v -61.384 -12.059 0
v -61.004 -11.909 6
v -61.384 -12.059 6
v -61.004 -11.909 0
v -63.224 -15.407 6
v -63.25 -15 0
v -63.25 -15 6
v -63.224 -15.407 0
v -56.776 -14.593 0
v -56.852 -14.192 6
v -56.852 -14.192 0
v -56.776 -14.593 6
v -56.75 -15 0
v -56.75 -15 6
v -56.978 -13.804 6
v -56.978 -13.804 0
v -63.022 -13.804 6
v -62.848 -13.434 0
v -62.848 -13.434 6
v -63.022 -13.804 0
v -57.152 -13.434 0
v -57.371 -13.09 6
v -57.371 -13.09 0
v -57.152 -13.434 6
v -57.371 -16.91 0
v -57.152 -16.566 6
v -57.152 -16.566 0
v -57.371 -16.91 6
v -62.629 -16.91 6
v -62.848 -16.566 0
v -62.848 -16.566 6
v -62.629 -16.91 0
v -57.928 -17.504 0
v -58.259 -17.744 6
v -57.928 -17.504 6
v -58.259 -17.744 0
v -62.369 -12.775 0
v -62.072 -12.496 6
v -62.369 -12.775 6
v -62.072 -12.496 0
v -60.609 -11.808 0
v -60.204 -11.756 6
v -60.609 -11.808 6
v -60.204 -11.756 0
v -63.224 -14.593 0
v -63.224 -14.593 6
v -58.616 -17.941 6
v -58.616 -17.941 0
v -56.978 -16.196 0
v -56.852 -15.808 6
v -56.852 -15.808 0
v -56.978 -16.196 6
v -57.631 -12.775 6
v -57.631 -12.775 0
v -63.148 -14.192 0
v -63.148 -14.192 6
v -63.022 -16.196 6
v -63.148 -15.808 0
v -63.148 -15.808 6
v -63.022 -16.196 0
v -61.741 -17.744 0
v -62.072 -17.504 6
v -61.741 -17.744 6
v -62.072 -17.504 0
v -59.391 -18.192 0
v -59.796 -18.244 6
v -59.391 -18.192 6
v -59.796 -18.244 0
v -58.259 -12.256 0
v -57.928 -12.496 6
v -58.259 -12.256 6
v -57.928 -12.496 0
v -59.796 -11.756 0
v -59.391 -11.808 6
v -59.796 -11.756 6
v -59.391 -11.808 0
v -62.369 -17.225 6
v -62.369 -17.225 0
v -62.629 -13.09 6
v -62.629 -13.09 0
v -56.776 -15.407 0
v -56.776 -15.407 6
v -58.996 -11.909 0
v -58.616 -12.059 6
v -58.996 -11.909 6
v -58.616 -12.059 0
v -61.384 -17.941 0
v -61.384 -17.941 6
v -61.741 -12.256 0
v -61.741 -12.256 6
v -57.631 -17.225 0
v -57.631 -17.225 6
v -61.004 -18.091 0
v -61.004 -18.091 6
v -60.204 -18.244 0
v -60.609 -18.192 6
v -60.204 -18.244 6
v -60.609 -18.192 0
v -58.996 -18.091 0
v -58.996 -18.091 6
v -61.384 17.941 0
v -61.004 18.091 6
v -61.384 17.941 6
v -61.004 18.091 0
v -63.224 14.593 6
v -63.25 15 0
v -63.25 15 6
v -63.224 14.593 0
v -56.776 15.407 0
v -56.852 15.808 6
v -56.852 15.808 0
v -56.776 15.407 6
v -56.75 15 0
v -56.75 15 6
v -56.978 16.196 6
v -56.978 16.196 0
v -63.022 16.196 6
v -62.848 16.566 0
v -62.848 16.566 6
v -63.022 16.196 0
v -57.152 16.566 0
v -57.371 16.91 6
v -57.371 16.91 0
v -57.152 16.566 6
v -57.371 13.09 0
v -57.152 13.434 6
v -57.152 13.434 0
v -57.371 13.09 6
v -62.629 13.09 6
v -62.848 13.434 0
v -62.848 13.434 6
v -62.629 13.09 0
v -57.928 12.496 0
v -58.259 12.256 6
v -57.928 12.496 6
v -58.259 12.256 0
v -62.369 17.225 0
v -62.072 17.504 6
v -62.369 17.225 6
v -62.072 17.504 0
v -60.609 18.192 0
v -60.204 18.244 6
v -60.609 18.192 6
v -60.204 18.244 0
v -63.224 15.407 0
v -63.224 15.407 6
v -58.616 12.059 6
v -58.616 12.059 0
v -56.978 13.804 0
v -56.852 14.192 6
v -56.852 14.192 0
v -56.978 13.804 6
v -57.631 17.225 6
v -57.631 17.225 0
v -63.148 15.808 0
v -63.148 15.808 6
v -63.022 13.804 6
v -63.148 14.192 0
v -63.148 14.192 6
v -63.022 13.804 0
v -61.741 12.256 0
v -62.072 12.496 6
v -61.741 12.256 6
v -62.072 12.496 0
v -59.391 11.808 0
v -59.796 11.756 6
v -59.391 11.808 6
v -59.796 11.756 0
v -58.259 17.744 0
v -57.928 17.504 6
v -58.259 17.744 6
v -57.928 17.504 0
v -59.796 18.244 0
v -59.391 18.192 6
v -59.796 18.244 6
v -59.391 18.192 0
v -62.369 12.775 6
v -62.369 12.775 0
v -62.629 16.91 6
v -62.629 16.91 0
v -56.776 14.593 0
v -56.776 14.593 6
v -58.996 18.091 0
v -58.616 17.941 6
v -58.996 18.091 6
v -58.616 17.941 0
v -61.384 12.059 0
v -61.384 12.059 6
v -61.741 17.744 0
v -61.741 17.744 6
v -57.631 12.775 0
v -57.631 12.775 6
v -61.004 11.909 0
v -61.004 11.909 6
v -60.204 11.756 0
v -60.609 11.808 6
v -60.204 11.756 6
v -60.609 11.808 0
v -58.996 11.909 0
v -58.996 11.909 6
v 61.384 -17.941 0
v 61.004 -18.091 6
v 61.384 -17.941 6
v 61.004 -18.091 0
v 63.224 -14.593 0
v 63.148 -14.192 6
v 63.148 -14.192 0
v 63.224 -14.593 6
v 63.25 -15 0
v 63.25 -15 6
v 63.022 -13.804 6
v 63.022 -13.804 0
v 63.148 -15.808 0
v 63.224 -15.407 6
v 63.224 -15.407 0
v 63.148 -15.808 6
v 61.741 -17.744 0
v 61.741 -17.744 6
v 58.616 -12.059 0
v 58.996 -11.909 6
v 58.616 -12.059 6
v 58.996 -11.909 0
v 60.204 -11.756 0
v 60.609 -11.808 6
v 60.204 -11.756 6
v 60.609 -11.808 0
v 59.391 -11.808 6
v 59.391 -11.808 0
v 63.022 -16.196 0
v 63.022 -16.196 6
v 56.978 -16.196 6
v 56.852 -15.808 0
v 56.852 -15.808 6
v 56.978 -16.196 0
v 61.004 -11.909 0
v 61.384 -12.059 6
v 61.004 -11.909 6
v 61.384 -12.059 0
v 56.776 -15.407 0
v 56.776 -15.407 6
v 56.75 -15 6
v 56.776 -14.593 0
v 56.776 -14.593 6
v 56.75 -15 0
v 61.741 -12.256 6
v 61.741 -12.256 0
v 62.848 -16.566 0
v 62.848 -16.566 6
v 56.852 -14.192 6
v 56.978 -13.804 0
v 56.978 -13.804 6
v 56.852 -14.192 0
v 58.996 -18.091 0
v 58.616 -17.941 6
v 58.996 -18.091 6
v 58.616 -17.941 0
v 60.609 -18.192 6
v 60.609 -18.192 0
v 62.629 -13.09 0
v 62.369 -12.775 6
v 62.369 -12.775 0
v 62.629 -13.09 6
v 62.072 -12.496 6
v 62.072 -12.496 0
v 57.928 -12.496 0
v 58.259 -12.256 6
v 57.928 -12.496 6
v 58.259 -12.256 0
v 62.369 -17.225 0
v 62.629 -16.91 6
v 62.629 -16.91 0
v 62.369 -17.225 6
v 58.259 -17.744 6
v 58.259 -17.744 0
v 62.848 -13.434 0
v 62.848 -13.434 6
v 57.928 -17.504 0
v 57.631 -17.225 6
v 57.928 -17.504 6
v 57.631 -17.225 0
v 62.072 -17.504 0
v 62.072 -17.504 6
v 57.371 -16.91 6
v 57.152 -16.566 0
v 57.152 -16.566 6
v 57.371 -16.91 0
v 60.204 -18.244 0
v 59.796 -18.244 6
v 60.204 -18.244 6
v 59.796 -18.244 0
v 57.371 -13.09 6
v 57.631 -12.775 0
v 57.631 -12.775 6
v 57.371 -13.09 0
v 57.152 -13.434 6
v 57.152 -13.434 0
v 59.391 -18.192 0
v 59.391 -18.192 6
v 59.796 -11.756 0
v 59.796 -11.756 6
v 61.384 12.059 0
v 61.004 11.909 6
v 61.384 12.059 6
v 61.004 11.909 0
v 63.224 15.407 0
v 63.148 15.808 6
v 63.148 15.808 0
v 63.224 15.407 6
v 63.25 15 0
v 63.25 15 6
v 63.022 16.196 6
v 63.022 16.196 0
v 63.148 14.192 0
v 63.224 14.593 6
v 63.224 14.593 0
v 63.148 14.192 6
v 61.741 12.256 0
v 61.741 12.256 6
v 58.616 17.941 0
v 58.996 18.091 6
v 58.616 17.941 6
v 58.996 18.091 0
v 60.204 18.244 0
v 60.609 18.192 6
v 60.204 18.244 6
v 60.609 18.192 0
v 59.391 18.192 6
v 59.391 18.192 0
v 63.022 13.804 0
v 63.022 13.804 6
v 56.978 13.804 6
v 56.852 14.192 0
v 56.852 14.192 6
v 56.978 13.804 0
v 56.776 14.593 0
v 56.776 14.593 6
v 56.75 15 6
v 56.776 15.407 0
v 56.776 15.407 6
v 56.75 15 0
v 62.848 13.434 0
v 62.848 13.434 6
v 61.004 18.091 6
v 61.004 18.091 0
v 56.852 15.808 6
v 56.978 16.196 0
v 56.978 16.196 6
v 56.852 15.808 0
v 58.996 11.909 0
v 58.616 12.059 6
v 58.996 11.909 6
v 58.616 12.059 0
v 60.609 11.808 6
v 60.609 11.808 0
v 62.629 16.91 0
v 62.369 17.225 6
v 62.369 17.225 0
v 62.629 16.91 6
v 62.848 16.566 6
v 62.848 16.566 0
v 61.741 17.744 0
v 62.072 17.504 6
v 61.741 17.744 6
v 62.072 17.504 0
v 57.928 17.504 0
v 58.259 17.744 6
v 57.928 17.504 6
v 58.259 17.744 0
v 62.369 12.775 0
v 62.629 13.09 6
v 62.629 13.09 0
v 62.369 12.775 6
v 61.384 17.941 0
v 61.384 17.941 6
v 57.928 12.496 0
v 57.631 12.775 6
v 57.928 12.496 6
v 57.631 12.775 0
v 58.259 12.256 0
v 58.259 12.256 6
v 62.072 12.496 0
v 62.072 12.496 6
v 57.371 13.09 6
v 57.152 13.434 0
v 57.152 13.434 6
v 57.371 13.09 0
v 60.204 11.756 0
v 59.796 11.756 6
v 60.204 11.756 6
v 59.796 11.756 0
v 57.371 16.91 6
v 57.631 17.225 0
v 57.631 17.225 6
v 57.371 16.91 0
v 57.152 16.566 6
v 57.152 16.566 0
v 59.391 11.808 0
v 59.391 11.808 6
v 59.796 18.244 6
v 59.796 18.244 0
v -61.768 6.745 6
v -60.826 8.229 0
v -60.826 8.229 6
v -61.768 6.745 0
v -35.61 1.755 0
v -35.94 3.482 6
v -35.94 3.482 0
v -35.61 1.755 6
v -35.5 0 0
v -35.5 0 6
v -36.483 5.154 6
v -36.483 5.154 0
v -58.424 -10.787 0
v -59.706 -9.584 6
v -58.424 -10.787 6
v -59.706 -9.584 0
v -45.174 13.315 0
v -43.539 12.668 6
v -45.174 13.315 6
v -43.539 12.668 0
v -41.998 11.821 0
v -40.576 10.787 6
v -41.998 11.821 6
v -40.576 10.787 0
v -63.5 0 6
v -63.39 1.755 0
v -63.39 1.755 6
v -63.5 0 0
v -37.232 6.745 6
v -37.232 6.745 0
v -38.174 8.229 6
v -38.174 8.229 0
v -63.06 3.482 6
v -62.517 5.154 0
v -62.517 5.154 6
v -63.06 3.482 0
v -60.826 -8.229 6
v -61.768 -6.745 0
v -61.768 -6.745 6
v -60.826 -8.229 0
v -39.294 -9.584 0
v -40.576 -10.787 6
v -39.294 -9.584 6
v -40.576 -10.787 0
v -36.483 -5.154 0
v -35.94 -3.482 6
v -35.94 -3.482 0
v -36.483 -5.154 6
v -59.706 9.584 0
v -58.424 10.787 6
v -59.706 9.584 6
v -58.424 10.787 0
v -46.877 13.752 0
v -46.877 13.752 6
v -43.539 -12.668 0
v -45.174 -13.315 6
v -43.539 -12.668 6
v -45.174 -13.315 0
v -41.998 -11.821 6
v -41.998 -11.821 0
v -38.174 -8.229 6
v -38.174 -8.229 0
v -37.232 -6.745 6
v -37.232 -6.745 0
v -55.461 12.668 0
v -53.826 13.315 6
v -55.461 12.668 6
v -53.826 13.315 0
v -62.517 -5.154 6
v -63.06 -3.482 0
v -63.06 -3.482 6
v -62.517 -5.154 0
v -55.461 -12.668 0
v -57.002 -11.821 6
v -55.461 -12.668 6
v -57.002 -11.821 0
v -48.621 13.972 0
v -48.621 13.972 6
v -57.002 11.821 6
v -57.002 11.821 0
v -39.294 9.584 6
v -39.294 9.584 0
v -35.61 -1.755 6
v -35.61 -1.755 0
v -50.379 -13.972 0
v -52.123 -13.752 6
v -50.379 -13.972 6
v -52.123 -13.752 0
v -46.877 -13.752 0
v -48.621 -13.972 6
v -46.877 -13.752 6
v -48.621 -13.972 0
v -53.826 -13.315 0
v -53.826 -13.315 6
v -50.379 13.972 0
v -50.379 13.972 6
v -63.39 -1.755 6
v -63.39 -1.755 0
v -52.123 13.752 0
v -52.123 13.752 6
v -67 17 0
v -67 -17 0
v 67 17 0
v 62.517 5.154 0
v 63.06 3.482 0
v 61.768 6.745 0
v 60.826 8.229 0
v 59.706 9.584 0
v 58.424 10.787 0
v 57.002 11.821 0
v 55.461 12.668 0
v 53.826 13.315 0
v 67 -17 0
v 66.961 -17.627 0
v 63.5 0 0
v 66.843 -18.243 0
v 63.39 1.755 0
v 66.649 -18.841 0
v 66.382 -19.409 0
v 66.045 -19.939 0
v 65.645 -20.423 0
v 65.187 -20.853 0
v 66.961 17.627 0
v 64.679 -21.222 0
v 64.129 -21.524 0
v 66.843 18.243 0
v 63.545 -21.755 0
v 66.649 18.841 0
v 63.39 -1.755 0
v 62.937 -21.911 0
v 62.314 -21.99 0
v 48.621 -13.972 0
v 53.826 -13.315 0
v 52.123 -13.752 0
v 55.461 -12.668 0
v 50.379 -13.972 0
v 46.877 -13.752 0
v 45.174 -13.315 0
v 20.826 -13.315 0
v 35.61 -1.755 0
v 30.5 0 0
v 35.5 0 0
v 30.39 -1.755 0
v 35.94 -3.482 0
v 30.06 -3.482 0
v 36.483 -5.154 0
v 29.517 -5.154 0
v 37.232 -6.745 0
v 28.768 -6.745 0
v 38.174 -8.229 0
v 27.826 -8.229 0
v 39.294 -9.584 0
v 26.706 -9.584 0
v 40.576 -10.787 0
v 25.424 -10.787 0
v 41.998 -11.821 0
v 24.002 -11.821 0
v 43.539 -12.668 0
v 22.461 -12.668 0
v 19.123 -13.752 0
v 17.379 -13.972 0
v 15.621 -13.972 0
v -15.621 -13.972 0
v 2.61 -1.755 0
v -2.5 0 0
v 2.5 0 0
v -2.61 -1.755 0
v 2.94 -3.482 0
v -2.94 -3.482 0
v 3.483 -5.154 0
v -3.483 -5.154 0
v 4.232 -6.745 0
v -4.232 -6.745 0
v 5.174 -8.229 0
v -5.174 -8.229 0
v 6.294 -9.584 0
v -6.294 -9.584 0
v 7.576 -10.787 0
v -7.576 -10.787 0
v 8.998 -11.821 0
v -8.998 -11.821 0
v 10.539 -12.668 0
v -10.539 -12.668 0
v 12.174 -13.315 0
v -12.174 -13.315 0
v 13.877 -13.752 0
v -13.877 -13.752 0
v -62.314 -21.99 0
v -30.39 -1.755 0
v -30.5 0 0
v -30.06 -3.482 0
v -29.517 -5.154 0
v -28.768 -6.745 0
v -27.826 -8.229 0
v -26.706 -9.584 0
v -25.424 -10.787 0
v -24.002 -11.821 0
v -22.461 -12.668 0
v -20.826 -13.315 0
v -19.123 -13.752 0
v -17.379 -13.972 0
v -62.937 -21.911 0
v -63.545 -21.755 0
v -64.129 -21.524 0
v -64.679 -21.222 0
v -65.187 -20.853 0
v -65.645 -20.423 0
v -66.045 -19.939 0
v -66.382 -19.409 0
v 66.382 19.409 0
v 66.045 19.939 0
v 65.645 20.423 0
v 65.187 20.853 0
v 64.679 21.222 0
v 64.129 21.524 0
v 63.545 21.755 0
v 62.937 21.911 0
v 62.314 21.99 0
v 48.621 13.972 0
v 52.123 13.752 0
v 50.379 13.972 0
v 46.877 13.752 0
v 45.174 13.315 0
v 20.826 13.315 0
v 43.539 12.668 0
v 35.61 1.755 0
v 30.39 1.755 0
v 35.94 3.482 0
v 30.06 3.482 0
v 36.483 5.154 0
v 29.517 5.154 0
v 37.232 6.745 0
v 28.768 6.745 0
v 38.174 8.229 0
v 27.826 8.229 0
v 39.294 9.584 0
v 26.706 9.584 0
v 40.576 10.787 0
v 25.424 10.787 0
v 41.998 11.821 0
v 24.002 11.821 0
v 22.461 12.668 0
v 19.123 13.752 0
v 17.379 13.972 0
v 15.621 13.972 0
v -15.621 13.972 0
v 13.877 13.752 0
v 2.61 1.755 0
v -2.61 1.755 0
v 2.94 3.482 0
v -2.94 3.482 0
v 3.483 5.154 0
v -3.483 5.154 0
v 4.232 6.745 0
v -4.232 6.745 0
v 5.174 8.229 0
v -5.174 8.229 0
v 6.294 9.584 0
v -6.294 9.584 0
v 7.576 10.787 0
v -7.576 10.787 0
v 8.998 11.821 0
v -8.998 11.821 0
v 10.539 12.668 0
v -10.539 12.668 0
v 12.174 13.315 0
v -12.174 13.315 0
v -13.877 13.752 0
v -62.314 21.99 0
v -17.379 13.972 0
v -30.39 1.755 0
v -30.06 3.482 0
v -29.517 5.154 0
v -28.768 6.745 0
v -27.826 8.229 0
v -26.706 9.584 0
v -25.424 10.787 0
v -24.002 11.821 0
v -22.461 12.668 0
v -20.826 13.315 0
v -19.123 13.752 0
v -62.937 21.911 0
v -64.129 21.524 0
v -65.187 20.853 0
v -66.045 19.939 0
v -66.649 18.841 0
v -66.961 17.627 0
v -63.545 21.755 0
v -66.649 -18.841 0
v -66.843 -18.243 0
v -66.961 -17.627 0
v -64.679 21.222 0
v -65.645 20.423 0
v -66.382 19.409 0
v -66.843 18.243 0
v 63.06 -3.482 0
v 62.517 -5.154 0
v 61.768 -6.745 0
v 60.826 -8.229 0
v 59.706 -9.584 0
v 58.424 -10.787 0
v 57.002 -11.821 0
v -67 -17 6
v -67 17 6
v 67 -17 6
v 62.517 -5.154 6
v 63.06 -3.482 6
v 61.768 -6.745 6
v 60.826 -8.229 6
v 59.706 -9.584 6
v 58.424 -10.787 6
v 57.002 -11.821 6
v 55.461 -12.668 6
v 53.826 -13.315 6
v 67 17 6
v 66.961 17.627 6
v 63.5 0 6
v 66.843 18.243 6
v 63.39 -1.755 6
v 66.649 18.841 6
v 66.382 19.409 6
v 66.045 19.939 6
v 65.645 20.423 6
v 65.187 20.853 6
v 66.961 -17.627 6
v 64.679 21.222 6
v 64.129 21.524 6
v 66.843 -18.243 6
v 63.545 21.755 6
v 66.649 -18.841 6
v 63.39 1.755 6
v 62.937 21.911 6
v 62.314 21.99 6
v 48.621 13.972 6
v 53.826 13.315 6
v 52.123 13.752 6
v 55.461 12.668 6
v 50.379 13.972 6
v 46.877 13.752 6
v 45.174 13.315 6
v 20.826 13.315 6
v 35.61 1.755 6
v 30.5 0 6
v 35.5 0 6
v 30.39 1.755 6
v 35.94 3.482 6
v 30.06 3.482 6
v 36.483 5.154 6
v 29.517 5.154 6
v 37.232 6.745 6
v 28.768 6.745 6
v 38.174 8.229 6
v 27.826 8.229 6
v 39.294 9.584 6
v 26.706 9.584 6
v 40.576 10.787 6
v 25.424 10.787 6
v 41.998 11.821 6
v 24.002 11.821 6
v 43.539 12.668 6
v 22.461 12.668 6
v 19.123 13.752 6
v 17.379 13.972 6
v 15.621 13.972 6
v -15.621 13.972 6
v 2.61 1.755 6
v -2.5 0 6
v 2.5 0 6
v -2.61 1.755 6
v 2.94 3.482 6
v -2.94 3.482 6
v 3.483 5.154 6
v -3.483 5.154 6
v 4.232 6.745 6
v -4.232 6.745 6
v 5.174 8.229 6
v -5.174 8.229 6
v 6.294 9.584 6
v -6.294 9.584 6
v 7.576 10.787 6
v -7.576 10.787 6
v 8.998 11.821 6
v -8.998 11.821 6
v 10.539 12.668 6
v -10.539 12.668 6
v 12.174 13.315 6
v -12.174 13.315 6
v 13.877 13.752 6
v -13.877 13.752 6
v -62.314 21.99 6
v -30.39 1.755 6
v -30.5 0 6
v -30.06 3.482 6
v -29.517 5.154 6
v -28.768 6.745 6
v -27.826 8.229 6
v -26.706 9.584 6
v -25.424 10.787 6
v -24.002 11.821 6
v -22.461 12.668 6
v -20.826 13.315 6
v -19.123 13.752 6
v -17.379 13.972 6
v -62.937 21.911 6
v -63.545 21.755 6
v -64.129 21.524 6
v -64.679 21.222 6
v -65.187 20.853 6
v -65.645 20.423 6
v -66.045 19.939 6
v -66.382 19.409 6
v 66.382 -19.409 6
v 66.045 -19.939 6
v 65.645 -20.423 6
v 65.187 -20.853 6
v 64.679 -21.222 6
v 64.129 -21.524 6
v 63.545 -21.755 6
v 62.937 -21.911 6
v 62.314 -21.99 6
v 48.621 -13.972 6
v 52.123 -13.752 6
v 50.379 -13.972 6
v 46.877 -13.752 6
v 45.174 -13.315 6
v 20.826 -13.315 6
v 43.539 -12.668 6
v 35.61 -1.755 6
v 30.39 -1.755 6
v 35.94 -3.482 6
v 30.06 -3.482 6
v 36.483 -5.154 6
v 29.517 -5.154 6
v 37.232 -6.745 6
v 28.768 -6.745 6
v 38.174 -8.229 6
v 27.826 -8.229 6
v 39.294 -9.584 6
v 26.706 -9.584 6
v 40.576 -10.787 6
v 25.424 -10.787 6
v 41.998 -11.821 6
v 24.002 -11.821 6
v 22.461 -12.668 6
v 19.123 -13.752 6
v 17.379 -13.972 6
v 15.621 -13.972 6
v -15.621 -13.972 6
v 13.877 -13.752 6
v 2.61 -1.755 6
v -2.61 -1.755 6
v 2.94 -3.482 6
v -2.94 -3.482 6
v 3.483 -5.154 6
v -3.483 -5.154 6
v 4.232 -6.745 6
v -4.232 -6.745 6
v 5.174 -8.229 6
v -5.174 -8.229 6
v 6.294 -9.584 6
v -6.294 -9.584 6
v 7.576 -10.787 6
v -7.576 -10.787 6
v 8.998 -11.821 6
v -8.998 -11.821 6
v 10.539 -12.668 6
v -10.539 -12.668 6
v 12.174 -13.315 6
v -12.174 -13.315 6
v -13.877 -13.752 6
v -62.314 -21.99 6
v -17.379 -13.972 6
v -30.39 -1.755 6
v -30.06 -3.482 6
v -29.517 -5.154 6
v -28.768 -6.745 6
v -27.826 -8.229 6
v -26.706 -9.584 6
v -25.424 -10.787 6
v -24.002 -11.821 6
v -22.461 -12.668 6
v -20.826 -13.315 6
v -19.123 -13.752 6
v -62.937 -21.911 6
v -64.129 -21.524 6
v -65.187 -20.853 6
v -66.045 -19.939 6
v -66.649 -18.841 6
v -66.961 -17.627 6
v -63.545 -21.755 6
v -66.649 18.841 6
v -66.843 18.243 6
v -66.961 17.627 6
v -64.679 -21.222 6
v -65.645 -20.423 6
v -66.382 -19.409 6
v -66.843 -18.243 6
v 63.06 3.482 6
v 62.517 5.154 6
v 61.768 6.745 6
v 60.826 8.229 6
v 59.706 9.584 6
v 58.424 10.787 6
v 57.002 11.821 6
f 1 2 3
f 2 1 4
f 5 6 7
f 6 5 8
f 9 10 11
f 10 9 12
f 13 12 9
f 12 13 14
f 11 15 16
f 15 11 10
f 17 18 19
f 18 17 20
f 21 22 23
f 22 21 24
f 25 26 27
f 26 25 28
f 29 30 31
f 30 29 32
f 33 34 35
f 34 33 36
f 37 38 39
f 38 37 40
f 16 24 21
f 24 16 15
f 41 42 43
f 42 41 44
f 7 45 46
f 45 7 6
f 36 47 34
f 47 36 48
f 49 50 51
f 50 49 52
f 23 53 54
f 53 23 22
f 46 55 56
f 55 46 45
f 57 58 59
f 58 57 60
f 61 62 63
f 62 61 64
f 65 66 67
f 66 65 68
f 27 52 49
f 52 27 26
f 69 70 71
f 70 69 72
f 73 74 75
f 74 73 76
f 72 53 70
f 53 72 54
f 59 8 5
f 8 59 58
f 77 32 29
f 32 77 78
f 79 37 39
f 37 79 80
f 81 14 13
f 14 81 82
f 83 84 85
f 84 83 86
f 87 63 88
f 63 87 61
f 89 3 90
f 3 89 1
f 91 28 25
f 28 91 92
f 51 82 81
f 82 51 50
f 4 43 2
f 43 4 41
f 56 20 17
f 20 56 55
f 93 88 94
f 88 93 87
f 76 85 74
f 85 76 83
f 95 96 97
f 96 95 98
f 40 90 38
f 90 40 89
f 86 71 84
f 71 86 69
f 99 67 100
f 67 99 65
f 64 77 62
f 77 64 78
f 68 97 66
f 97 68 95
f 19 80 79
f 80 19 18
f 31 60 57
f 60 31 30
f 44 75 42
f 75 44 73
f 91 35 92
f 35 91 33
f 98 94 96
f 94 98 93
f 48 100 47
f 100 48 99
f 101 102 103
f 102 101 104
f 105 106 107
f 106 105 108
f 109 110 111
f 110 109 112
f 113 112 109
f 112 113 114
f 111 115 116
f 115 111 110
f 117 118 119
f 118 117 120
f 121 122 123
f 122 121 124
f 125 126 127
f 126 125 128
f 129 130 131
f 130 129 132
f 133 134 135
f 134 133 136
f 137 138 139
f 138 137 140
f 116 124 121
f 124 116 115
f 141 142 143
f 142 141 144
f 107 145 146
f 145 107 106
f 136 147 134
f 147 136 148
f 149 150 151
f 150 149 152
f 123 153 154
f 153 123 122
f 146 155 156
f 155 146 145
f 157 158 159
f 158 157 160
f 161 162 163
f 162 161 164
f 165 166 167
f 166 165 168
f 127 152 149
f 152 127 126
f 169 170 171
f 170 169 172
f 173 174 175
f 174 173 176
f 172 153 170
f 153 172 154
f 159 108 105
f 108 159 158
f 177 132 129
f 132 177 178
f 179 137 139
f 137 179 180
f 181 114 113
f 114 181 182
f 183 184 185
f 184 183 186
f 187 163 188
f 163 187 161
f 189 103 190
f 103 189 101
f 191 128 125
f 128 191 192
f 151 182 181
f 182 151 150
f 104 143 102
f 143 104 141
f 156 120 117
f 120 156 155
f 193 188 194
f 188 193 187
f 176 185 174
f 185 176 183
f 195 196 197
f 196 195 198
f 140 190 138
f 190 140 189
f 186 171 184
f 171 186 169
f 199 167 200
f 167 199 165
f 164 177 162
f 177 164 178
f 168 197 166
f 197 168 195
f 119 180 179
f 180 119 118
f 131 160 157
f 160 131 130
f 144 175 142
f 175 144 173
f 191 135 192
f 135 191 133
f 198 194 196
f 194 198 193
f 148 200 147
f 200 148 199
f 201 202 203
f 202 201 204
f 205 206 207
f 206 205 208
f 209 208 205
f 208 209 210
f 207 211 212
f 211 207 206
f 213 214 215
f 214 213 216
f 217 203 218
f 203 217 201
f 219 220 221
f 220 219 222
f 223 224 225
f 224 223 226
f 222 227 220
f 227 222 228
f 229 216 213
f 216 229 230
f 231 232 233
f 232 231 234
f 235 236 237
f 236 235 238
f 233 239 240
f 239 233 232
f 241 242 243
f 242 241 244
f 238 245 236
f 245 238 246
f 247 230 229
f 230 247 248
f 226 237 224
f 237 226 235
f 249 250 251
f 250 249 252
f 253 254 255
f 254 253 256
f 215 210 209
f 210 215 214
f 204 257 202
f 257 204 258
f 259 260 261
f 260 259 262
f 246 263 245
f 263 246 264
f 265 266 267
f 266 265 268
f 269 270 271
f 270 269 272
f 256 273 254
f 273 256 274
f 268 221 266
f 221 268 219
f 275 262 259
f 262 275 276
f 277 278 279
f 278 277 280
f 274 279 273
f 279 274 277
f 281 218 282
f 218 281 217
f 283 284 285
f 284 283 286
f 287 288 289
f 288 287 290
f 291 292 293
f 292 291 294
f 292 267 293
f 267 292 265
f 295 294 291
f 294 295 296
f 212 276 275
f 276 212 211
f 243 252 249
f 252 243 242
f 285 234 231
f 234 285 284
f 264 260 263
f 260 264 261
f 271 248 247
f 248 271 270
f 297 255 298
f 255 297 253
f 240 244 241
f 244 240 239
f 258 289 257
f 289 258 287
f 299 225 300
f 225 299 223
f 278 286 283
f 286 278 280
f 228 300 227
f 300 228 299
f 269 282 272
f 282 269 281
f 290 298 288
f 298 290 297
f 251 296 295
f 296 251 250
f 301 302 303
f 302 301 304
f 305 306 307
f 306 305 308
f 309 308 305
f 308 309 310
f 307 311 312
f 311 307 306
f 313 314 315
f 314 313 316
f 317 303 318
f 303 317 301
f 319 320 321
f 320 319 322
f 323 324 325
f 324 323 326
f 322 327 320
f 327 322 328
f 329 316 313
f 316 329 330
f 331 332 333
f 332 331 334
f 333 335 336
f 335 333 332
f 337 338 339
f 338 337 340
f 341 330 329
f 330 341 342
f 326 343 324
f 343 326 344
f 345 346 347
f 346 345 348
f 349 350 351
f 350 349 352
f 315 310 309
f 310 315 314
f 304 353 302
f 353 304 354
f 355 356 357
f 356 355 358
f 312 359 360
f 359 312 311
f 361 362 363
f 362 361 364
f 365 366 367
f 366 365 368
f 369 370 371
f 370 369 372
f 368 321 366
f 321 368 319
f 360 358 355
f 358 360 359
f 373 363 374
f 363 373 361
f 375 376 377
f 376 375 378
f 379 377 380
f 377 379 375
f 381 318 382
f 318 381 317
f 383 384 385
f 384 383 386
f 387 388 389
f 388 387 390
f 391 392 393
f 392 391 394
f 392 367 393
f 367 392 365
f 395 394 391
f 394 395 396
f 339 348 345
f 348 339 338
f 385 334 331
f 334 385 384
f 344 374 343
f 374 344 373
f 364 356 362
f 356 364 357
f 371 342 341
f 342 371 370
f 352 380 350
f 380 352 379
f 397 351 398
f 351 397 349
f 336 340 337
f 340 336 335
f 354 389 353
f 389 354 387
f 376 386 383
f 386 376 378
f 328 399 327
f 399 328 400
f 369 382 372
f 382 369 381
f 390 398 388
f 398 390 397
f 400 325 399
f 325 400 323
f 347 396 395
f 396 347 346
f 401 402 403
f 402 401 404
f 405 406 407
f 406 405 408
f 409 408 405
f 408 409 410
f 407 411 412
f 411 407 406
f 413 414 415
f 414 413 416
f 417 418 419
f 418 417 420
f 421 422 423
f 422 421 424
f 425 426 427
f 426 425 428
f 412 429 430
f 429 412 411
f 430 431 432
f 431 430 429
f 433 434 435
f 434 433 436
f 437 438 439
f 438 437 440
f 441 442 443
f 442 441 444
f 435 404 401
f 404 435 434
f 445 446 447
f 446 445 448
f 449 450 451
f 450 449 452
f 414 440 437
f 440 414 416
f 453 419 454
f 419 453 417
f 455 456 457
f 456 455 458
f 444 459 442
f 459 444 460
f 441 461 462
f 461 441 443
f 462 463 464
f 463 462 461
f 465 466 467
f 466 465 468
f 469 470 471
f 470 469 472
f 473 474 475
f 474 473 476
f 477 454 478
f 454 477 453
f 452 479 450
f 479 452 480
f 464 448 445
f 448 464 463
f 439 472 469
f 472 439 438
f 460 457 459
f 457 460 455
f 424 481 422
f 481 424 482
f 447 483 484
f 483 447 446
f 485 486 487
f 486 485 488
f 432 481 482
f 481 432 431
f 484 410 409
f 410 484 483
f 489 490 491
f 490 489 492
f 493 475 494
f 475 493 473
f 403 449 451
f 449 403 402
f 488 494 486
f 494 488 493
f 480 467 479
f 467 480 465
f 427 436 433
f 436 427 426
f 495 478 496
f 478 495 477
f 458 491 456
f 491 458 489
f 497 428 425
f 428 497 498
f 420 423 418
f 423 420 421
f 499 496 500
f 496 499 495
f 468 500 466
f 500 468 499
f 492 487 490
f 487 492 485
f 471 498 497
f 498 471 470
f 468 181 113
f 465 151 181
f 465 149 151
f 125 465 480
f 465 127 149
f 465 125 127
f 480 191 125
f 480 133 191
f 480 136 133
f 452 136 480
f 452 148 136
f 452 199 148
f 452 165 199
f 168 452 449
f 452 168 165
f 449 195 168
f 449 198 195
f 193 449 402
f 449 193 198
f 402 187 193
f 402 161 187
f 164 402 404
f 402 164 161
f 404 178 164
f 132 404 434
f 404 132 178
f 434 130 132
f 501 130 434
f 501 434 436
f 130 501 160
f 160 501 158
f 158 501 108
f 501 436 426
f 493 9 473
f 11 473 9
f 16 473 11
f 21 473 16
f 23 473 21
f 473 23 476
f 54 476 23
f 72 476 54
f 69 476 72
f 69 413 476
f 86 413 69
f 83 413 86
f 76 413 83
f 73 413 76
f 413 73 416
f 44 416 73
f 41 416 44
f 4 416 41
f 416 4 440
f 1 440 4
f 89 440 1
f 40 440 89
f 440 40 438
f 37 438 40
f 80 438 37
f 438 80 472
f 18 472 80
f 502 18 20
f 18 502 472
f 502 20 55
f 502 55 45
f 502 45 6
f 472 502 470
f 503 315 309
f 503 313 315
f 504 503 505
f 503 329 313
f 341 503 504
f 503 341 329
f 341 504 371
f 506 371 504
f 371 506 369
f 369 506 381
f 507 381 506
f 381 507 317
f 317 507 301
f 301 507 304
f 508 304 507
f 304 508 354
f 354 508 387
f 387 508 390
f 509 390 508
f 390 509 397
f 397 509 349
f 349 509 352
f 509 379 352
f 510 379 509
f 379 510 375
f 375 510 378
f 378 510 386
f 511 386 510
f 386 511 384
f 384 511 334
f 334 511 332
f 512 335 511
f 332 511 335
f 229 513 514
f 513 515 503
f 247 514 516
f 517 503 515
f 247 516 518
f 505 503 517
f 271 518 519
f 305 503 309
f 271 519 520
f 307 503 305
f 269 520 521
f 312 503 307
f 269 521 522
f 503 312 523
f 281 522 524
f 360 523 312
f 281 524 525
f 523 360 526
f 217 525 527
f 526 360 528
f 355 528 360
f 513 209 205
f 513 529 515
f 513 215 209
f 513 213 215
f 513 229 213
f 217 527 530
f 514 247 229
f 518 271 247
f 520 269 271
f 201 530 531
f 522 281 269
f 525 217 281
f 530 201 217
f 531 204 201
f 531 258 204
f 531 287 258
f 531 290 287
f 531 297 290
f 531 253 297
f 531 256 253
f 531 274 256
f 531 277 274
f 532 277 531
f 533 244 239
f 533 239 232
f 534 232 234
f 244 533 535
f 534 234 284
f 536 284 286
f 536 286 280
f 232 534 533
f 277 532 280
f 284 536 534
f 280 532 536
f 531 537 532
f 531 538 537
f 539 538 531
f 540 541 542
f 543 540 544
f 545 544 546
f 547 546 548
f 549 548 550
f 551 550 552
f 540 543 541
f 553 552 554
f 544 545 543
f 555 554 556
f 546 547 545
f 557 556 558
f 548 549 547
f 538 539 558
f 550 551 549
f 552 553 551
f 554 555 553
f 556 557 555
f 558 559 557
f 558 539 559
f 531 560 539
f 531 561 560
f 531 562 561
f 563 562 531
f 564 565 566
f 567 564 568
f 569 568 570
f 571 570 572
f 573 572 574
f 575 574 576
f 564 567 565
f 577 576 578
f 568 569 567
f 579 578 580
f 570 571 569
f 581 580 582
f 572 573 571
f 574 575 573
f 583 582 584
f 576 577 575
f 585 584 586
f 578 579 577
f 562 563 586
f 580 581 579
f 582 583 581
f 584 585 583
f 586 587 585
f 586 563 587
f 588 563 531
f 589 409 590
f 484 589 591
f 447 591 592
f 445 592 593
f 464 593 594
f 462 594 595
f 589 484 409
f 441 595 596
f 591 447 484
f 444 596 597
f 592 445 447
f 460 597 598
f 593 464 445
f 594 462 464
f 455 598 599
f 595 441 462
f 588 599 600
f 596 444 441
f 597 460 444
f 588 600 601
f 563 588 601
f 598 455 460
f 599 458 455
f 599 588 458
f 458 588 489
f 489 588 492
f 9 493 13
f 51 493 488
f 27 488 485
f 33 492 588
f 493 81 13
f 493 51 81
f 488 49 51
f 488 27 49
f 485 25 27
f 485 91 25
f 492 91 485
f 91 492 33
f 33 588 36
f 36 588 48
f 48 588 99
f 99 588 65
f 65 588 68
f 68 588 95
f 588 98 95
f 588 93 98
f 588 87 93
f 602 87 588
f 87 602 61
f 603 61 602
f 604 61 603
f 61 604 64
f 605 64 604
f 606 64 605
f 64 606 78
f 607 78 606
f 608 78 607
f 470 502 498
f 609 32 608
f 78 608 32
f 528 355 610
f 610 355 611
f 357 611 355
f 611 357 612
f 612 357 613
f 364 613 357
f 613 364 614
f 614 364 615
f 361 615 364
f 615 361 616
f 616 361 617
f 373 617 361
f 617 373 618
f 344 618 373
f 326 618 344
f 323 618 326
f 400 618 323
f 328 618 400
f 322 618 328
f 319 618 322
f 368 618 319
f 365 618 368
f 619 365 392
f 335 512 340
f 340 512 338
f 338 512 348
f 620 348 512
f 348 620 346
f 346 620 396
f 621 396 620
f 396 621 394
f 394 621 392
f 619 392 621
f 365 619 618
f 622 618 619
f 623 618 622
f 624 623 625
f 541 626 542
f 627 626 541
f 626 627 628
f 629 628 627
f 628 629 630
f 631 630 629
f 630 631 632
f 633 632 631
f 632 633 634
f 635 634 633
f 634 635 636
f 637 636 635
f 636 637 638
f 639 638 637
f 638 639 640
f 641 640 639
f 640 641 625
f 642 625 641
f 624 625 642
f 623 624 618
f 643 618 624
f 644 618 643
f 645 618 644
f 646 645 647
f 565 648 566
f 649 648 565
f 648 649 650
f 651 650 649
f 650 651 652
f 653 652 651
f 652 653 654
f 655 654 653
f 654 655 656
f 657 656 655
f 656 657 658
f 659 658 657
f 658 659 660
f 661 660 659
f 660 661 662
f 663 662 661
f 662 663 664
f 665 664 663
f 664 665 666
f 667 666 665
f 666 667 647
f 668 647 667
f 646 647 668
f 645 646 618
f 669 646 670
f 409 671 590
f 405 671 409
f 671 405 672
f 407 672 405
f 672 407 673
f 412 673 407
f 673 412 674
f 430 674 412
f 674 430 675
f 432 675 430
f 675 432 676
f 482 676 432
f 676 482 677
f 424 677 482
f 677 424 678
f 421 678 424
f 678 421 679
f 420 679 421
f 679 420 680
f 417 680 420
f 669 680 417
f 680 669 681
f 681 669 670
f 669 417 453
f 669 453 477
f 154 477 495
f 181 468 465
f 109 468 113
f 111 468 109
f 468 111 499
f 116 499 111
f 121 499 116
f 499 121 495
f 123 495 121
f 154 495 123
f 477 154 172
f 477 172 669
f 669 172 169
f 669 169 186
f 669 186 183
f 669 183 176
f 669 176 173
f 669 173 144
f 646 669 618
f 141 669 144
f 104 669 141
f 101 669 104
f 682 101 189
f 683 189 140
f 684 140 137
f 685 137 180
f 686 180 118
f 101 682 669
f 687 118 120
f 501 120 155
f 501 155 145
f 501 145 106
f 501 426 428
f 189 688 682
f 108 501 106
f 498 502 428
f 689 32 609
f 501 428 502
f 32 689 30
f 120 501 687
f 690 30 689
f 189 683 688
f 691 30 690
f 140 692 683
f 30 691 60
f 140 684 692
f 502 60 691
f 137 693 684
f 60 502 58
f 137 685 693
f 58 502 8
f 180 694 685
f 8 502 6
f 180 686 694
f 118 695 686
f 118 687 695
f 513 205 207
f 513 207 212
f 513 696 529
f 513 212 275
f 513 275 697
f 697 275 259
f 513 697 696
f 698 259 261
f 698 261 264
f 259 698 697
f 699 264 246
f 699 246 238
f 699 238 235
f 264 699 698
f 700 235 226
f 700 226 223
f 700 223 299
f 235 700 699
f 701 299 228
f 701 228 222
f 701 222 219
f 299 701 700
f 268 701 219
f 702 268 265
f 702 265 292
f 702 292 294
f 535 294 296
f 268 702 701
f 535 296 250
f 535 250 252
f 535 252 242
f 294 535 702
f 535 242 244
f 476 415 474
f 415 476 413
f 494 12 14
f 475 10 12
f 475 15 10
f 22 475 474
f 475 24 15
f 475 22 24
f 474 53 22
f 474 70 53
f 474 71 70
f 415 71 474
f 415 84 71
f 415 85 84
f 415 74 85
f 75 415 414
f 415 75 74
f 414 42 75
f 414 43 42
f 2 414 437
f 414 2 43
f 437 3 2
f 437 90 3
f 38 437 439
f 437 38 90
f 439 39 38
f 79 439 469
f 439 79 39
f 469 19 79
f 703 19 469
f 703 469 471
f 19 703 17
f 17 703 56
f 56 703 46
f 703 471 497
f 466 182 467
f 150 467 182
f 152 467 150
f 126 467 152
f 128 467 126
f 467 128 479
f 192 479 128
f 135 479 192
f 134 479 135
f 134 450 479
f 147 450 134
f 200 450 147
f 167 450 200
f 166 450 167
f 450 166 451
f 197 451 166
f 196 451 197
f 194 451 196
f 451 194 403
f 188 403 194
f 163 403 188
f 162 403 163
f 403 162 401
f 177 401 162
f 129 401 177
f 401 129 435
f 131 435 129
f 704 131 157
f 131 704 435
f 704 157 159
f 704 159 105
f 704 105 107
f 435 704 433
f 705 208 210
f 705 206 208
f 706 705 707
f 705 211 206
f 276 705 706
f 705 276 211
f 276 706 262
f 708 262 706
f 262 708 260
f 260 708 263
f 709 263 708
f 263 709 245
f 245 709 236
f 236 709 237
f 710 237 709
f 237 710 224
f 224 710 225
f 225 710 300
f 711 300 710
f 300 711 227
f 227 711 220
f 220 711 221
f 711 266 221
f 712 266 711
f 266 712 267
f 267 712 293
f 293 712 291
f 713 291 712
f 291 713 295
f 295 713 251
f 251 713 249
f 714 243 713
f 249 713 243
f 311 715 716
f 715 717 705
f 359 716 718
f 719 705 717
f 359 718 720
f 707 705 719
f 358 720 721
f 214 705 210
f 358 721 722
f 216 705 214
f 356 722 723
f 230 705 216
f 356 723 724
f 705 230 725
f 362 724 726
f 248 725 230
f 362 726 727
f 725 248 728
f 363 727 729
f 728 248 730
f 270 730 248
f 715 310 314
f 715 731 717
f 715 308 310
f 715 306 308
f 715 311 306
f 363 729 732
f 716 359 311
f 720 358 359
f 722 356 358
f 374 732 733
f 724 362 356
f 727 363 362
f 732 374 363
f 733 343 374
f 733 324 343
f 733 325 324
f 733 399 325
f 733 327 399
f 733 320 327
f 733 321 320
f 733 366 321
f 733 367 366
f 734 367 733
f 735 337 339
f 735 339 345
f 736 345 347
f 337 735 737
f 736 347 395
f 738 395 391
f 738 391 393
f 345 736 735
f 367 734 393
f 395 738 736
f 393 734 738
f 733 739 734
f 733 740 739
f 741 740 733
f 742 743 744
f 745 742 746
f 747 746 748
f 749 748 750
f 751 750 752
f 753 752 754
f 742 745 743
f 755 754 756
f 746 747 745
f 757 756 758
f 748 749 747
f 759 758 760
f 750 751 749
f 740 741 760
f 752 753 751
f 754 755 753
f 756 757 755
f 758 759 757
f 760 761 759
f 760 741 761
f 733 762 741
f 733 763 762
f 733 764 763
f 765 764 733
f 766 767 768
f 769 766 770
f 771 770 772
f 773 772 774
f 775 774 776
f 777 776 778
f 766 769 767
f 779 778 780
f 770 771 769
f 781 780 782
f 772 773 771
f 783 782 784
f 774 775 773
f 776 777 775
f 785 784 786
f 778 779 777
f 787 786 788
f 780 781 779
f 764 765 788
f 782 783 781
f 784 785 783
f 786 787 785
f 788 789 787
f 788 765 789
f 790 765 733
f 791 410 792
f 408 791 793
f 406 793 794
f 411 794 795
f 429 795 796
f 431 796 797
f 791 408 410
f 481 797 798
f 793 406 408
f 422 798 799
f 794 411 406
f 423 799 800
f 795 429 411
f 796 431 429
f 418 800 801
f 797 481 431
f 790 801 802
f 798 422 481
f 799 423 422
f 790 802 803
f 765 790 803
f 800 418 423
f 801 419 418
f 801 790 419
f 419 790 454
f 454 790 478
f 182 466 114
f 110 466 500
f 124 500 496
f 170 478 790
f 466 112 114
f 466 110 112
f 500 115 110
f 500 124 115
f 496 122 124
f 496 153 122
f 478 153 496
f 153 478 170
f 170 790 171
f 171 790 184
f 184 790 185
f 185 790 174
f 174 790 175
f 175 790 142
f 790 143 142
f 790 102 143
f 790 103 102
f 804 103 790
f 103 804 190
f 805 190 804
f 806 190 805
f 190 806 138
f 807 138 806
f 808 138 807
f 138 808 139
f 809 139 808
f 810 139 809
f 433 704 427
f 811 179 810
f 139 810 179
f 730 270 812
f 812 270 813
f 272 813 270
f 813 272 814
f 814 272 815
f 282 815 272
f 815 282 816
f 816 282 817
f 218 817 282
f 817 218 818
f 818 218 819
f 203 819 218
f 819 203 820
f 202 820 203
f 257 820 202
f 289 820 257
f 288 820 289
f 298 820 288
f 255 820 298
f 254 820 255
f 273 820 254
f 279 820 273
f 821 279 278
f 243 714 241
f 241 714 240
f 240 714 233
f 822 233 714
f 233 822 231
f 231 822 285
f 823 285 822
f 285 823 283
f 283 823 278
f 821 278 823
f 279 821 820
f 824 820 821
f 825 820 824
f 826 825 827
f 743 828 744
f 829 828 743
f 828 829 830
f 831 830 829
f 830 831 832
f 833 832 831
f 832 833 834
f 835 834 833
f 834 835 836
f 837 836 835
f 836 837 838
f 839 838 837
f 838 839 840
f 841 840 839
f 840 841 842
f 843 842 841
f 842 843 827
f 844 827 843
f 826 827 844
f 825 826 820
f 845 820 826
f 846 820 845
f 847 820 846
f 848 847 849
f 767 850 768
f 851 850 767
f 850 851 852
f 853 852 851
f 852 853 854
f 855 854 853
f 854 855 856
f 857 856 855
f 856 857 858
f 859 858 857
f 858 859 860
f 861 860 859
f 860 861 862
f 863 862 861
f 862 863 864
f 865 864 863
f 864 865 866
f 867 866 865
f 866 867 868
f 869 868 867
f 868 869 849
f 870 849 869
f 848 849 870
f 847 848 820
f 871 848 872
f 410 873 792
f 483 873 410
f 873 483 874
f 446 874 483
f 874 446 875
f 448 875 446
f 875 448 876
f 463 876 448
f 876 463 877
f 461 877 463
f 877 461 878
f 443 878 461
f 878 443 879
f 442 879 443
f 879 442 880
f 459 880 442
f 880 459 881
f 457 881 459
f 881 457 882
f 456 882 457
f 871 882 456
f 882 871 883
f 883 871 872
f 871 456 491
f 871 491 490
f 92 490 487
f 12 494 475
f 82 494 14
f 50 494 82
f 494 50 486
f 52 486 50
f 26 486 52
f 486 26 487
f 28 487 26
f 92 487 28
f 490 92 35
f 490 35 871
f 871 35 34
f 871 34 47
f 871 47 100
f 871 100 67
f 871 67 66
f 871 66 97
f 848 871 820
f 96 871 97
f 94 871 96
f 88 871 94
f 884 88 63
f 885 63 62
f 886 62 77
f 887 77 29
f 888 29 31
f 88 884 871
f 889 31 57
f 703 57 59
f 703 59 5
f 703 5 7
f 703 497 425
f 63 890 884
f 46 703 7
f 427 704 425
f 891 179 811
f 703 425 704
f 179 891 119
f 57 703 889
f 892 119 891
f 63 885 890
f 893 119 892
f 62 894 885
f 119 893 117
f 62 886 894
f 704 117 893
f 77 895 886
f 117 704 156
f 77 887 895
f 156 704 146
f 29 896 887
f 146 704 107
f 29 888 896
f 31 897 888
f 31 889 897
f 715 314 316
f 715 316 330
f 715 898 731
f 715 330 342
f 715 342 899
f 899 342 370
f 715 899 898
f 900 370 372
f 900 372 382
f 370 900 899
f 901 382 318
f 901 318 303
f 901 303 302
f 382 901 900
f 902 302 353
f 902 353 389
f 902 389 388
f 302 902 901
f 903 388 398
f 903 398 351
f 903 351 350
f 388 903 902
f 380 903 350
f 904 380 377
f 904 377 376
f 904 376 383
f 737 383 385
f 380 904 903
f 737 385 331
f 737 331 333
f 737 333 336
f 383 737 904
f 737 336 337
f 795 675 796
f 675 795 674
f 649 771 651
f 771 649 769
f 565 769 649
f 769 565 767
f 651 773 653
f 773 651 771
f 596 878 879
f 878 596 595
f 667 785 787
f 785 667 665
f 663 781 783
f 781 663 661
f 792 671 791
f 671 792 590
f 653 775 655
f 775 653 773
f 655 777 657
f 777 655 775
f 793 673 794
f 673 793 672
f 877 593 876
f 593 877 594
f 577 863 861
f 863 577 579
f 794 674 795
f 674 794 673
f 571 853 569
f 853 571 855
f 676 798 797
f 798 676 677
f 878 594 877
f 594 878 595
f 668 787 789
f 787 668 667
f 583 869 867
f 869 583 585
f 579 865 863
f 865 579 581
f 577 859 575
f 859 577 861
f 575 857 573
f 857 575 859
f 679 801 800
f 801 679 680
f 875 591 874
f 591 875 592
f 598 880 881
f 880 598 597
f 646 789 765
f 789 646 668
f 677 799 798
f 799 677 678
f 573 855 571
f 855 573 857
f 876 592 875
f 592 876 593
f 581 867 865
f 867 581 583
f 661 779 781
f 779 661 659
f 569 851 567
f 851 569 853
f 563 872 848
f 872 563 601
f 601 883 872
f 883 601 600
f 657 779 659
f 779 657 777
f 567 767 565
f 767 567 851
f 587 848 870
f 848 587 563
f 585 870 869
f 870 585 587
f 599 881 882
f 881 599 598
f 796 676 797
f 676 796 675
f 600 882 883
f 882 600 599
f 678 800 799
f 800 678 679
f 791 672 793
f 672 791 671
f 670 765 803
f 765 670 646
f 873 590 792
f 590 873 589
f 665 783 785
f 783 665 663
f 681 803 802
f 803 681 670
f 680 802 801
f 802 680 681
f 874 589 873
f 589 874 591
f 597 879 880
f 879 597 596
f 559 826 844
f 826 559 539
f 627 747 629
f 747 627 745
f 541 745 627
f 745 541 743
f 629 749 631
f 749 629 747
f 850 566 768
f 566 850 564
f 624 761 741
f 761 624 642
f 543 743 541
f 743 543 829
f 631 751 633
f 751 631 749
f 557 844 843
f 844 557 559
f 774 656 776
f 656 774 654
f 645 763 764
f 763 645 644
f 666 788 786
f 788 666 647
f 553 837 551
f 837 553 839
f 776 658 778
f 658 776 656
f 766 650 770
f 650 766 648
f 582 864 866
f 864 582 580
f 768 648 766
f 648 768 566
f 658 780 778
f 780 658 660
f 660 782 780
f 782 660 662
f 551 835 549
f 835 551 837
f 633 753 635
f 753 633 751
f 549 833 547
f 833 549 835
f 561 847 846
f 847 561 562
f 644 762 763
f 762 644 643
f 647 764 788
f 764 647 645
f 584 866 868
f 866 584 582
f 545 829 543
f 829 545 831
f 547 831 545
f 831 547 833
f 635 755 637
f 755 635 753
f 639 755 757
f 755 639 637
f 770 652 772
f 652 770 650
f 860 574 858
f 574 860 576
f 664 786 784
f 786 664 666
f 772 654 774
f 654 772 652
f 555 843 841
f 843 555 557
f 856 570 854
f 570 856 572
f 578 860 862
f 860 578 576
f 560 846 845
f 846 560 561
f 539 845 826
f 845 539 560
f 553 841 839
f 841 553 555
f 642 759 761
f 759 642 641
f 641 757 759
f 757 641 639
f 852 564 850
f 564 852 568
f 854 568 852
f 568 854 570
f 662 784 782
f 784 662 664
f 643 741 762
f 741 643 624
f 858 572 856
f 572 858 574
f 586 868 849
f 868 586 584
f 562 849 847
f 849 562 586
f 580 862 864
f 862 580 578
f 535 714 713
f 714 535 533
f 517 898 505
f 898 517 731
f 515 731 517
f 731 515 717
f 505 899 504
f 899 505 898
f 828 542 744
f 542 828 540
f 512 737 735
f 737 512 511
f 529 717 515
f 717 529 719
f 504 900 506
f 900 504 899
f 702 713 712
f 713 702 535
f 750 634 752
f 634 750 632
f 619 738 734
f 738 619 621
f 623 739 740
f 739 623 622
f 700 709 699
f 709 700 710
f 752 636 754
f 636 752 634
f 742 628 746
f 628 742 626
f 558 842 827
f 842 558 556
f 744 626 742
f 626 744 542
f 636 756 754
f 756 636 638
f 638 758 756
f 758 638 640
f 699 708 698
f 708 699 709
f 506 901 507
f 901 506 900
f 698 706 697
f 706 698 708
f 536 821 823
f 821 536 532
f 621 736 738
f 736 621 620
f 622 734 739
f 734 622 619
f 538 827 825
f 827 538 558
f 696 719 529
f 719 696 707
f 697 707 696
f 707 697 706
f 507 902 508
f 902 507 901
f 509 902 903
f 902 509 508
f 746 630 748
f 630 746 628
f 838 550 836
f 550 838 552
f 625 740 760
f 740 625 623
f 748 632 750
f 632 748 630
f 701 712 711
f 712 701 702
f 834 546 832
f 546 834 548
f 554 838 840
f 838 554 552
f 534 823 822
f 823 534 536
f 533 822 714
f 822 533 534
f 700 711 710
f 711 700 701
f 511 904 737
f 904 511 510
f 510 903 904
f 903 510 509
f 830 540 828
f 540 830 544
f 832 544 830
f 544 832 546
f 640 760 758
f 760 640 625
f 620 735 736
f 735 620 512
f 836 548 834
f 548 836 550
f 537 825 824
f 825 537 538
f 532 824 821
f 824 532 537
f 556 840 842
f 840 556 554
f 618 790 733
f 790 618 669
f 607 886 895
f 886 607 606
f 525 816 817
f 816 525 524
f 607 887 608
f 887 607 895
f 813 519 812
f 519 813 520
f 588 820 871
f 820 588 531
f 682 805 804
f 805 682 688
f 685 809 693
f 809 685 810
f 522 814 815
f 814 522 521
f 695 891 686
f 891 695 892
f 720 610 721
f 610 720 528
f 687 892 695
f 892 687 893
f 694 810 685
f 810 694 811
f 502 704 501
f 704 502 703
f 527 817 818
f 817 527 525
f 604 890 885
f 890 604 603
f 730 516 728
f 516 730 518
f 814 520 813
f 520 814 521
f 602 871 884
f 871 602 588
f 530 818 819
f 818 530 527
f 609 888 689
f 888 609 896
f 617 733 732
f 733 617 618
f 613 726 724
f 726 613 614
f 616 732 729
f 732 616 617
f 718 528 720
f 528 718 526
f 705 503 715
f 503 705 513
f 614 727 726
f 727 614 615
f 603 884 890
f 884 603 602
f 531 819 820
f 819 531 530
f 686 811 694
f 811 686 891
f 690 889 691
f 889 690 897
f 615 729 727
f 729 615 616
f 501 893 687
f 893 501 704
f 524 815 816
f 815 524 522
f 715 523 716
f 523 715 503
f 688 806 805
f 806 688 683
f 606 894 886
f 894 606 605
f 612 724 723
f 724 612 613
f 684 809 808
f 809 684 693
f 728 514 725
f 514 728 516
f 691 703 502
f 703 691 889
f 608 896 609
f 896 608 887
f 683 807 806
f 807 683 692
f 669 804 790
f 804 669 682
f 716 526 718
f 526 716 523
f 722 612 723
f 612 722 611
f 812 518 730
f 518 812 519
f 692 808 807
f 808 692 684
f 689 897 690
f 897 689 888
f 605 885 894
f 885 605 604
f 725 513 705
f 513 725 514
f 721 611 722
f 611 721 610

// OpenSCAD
$fn = 50;


difference() {
	union() {
		hull() {
			translate(v = [-62.0000000000, 17.0000000000, 0]) {
				cylinder(h = 6, r = 5);
			}
			translate(v = [62.0000000000, 17.0000000000, 0]) {
				cylinder(h = 6, r = 5);
			}
			translate(v = [-62.0000000000, -17.0000000000, 0]) {
				cylinder(h = 6, r = 5);
			}
			translate(v = [62.0000000000, -17.0000000000, 0]) {
				cylinder(h = 6, r = 5);
			}
		}
	}
	union() {
		#translate(v = [-60.0000000000, -15.0000000000, -100.0000000000]) {
			cylinder(h = 200, r = 3.2500000000);
		}
		#translate(v = [-60.0000000000, 15.0000000000, -100.0000000000]) {
			cylinder(h = 200, r = 3.2500000000);
		}
		#translate(v = [60.0000000000, -15.0000000000, -100.0000000000]) {
			cylinder(h = 200, r = 3.2500000000);
		}
		#translate(v = [60.0000000000, 15.0000000000, -100.0000000000]) {
			cylinder(h = 200, r = 3.2500000000);
		}
		#translate(v = [-49.5000000000, 0, 0]) {
			cylinder(h = 6, r = 14.0000000000);
		}
		#translate(v = [-16.5000000000, 0, 0]) {
			cylinder(h = 6, r = 14.0000000000);
		}
		#translate(v = [16.5000000000, 0, 0]) {
			cylinder(h = 6, r = 14.0000000000);
		}
		#translate(v = [49.5000000000, 0, 0]) {
			cylinder(h = 6, r = 14.0000000000);
		}
	}
}
